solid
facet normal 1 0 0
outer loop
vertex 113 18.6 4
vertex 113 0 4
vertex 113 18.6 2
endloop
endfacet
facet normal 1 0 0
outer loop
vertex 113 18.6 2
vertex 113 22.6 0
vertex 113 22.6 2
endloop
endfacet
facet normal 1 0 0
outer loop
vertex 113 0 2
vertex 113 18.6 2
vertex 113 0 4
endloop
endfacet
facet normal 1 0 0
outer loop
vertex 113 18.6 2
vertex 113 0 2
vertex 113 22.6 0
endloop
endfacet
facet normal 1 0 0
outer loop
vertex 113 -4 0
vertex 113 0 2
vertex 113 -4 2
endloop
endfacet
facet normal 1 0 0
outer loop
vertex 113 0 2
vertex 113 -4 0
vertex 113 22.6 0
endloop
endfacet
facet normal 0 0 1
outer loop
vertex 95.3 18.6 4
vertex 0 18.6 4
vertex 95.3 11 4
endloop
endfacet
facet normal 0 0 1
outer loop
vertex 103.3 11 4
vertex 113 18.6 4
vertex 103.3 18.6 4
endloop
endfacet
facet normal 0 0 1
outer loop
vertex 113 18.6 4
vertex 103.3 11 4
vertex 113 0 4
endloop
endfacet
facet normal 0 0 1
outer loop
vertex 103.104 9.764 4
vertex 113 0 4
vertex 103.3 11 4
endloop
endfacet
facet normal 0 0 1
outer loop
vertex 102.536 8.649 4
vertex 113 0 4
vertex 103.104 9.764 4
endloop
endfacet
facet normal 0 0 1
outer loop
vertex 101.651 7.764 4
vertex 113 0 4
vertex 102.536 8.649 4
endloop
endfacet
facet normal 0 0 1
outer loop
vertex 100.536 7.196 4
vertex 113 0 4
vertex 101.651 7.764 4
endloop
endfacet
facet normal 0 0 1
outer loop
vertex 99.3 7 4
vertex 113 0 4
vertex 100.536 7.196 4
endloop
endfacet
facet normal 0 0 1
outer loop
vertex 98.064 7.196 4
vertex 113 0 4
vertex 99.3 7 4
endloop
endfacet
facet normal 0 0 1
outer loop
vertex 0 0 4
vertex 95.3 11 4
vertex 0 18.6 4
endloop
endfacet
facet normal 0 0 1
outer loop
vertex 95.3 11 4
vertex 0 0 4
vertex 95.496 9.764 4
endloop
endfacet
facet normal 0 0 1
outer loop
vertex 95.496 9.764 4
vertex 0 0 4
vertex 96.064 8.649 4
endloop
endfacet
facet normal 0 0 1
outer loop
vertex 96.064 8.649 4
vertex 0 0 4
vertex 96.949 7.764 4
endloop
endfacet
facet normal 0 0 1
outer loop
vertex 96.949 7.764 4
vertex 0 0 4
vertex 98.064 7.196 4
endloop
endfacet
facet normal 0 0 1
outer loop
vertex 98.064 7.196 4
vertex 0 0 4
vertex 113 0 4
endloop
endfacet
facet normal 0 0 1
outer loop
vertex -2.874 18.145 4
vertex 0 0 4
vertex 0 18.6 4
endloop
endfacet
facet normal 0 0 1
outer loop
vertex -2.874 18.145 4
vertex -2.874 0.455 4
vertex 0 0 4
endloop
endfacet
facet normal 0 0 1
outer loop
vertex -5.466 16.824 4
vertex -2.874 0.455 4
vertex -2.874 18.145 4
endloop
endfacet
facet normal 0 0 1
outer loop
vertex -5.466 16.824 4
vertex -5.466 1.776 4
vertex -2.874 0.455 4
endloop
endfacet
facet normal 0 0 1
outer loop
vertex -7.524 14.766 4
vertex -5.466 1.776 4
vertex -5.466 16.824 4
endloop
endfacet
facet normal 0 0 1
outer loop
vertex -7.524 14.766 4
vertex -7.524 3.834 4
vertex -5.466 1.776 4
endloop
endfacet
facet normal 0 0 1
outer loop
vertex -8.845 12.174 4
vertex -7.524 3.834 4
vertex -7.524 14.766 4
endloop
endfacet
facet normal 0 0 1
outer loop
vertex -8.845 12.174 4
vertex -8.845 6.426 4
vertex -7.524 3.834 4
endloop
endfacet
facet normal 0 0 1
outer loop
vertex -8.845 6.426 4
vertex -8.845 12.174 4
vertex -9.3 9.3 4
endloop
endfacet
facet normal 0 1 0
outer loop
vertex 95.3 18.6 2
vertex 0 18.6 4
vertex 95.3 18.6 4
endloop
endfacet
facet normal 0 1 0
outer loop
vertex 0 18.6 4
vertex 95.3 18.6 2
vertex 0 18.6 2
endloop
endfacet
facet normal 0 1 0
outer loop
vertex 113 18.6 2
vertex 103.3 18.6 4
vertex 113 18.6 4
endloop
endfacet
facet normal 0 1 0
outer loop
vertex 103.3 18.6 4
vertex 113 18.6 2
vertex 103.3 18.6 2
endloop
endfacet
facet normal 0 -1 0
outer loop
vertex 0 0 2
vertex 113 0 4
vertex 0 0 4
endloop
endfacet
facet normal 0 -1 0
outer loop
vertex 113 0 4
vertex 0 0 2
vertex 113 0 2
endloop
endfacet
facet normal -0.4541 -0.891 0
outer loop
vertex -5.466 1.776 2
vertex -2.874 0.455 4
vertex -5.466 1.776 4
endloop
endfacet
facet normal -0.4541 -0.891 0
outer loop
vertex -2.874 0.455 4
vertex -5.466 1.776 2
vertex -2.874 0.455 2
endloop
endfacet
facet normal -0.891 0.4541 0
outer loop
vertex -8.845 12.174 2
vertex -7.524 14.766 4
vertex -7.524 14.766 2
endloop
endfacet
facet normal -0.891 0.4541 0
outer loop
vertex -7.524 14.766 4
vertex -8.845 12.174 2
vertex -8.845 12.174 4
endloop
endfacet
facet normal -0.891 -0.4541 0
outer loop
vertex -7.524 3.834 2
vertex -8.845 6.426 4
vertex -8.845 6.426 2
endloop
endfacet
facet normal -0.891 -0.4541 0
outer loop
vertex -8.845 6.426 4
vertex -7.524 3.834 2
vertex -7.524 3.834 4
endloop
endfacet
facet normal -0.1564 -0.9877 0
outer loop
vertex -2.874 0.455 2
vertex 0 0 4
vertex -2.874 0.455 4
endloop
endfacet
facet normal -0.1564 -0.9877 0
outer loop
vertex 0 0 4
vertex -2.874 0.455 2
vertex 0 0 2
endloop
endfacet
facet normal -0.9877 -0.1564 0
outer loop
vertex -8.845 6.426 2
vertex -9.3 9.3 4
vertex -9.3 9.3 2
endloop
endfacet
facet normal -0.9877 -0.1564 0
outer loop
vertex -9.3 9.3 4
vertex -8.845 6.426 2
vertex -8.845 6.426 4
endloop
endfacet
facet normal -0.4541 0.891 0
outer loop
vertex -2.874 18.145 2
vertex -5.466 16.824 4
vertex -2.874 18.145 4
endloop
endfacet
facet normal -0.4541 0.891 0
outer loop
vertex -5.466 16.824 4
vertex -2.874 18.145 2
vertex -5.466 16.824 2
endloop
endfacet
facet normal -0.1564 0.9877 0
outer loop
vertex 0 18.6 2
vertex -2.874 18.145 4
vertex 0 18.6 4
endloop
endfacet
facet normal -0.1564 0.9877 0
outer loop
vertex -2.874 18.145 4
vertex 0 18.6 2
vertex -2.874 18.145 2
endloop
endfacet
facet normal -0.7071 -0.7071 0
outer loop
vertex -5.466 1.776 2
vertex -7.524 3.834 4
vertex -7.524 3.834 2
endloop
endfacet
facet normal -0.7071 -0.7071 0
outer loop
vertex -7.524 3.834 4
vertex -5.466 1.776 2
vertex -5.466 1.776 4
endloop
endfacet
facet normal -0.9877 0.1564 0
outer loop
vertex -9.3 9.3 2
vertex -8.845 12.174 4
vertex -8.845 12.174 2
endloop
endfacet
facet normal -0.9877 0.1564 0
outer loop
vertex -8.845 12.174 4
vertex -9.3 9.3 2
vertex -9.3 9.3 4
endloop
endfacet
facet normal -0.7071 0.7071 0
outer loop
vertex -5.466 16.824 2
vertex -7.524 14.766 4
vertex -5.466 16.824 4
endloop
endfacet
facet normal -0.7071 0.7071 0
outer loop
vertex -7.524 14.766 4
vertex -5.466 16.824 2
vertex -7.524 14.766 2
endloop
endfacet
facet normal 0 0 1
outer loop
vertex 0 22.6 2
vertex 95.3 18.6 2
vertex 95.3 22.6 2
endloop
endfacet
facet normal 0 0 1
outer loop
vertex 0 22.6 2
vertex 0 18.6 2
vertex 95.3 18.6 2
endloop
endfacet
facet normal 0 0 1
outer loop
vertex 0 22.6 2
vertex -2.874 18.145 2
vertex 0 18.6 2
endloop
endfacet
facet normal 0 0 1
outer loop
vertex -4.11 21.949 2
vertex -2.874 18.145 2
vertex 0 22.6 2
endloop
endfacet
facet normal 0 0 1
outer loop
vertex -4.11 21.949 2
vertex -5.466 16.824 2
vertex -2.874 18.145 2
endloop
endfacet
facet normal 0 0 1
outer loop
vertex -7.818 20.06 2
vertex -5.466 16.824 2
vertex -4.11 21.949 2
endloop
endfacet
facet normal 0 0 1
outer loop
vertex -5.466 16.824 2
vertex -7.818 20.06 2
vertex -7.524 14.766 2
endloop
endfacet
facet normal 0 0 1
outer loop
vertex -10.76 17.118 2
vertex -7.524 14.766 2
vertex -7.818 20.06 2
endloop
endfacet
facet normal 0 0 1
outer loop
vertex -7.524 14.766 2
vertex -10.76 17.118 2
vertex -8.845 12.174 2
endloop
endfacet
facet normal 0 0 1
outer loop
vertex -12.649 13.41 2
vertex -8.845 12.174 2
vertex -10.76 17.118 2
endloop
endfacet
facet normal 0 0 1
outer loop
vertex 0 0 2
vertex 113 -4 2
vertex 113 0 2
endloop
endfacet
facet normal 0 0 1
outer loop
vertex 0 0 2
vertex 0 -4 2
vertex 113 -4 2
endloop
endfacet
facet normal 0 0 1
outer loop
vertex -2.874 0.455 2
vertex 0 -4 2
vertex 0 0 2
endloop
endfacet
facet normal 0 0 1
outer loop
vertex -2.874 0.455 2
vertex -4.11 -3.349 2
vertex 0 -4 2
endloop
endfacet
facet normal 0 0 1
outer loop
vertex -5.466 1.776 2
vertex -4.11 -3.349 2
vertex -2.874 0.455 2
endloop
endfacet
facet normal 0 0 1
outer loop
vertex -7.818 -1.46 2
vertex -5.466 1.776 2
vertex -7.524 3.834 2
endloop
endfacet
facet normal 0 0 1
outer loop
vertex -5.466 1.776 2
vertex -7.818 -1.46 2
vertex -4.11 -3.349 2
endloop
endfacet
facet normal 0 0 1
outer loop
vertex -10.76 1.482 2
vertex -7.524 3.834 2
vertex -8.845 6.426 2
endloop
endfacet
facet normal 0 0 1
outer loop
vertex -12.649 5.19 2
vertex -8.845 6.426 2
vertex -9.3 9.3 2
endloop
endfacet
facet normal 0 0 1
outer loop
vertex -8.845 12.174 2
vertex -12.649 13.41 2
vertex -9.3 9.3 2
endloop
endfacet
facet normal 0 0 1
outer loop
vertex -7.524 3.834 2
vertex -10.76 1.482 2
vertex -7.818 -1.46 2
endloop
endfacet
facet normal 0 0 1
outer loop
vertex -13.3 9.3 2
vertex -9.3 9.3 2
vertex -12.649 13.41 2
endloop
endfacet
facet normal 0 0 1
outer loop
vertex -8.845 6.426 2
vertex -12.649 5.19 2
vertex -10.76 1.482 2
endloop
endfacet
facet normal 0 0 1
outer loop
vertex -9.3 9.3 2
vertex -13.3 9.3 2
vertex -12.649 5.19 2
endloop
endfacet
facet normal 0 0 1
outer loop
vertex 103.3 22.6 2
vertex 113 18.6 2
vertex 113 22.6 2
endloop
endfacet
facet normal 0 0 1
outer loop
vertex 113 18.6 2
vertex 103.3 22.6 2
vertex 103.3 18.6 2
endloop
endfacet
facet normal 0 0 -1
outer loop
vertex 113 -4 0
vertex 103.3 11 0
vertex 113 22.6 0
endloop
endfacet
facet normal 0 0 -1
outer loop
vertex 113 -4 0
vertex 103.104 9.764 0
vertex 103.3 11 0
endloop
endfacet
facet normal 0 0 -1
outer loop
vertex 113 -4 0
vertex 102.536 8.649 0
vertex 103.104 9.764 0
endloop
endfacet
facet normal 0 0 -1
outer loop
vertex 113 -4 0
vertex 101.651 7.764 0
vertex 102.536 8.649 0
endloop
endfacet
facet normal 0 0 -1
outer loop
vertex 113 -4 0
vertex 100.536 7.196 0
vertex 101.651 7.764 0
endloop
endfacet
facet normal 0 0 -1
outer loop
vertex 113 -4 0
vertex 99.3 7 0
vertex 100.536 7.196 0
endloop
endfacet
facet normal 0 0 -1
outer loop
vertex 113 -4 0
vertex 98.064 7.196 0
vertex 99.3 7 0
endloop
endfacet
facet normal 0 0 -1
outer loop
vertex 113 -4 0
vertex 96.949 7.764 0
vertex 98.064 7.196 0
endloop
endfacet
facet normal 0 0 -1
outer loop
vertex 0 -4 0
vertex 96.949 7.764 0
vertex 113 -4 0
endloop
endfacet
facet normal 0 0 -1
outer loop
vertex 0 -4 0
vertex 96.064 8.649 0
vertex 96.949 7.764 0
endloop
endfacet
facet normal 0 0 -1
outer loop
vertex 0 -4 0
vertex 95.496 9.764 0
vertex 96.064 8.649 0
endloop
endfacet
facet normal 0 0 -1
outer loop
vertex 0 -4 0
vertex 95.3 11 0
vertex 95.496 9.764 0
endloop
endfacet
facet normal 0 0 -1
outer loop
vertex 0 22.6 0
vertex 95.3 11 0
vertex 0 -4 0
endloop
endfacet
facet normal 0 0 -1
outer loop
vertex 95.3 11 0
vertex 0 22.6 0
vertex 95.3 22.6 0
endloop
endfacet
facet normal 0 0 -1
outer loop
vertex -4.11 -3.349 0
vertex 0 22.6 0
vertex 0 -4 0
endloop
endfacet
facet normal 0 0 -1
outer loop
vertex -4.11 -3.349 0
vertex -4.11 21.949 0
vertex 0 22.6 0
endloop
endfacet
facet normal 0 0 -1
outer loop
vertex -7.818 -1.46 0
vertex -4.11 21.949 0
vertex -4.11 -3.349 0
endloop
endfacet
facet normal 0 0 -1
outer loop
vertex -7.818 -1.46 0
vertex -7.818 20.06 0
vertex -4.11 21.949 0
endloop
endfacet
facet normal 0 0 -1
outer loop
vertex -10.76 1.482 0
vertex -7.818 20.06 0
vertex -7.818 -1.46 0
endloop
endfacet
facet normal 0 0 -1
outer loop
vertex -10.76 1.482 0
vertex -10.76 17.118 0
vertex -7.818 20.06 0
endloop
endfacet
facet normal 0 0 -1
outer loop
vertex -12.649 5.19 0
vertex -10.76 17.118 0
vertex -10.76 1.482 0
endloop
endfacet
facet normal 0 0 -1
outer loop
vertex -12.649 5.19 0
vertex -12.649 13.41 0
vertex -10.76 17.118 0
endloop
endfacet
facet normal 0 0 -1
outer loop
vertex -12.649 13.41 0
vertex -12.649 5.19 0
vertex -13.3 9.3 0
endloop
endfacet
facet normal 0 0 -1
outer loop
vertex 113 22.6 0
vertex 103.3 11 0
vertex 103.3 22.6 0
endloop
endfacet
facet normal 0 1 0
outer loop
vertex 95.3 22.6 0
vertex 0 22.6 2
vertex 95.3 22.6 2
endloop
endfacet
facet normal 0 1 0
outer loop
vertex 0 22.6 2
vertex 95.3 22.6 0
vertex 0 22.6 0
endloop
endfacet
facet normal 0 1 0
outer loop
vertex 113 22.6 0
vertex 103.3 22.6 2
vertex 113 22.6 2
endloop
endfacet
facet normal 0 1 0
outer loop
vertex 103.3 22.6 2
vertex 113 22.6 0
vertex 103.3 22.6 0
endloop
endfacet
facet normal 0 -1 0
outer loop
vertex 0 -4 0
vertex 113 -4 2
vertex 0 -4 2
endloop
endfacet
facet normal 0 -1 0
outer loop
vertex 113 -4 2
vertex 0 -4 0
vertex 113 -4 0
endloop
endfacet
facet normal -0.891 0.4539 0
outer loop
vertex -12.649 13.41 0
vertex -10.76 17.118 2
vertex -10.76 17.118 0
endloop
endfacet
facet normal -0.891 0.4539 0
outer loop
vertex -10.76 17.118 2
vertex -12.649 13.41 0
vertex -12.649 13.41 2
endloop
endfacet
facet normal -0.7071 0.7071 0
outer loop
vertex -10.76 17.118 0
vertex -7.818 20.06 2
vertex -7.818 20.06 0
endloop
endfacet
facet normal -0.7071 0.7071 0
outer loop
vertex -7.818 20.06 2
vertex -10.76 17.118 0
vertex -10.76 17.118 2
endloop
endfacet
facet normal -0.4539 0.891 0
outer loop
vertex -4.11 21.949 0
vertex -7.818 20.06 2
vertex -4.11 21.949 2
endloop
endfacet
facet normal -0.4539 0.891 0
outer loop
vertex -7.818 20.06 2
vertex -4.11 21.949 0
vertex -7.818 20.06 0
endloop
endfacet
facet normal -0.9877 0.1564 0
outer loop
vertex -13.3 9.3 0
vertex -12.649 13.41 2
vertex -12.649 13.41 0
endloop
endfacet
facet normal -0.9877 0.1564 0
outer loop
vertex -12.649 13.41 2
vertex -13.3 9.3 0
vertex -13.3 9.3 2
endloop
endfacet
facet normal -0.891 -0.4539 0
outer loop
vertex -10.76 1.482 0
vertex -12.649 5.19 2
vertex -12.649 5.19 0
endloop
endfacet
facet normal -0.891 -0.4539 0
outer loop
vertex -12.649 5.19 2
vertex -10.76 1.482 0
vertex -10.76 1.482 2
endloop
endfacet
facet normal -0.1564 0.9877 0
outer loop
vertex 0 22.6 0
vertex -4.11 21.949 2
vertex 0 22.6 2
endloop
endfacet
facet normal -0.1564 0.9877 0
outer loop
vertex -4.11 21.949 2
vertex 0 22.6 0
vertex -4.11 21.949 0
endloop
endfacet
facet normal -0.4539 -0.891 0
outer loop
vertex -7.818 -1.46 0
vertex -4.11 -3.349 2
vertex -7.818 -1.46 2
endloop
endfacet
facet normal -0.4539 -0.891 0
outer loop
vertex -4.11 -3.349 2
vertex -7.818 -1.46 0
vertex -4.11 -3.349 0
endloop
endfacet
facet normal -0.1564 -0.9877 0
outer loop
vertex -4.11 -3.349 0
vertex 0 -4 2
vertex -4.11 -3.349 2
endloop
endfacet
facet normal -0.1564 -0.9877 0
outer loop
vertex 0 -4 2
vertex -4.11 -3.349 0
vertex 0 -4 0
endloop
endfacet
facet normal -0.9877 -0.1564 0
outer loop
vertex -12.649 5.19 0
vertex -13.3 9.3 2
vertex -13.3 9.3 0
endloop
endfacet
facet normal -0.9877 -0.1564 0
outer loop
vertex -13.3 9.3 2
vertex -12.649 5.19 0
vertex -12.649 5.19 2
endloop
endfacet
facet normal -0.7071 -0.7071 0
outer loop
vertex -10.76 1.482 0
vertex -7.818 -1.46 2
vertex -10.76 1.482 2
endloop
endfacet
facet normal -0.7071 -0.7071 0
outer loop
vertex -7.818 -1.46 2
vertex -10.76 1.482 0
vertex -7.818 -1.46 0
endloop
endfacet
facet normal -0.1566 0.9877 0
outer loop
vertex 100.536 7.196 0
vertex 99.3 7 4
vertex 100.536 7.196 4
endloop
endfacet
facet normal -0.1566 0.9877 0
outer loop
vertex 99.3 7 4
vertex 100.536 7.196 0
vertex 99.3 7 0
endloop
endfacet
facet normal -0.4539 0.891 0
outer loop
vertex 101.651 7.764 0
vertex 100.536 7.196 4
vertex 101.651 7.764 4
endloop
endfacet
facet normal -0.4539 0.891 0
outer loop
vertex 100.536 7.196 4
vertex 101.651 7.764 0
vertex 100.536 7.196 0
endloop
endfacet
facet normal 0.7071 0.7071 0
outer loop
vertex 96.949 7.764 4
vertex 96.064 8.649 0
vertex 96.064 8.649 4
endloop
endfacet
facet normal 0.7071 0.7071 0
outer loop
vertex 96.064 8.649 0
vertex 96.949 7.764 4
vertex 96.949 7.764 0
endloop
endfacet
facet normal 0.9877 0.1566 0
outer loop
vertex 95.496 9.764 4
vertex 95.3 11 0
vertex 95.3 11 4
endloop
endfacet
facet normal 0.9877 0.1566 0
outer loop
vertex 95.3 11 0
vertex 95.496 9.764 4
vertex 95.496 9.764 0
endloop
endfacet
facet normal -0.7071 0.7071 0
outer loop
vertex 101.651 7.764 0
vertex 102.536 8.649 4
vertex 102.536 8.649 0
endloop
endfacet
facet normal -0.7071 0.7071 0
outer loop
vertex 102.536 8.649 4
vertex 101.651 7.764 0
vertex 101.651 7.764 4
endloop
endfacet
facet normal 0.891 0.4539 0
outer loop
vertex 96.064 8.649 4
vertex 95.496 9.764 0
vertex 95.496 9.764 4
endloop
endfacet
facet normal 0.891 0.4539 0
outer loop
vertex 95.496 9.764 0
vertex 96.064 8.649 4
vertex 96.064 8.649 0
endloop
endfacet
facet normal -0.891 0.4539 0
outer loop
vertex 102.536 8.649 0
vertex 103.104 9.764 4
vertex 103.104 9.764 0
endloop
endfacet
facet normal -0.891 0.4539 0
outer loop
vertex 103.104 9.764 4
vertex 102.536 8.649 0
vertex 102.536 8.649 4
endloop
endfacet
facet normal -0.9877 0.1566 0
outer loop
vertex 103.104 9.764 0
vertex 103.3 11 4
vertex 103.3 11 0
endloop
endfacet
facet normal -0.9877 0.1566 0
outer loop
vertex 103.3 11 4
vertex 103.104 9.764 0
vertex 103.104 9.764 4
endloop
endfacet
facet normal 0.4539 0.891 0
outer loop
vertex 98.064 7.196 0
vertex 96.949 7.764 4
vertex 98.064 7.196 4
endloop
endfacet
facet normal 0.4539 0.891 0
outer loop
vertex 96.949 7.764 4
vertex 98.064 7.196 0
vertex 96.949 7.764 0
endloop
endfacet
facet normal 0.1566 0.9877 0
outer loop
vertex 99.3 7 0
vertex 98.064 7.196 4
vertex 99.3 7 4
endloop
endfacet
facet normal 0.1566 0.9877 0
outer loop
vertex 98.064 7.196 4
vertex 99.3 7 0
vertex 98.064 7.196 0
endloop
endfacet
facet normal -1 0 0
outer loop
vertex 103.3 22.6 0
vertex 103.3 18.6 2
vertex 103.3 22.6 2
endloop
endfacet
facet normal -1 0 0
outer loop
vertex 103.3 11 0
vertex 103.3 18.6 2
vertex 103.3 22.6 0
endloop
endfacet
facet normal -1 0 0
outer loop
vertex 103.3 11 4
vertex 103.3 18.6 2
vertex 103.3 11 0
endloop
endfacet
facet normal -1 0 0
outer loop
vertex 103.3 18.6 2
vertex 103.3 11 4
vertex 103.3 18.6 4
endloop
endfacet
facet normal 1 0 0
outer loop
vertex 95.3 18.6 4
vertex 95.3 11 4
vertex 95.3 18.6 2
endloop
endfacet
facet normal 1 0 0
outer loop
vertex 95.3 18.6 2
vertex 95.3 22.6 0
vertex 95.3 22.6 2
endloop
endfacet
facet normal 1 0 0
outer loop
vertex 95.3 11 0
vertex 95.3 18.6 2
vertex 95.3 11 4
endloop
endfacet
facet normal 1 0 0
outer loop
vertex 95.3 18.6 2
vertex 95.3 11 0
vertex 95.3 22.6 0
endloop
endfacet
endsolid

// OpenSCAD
l = 113;
r = 9.3;
h = 4;
del = 4;

difference() {
    union() {
        translate( [ 0, 0, 1 ] )
        {
            cube( [ l, 2 * r, h - 1 ] );
            translate( [ 0, r, 0 ] )
                cylinder( r = r, h = h - 1, $fn = 20 );
        }
        translate( [ 0, -del, 0 ] )
            cube( [ l, 2 * ( r + del ), h / 2 ] );
        translate( [ 0, r, 0 ] )
            cylinder( r = r + del, h = h / 2, $fn = 20 );
    }
//    translate( [ 0, r, -1 ] )
//    {
//        #cylinder( r = 4, h = 15, $fn = 20 );
//        translate( [ -15, -4, 0 ] )
//            #cube( [ 15, 8, 10 ] );
//    }

    translate( [ 90, 11, 0 ] )
    rotate( -90, [ 0, 0, 1 ] )
        translate( [ 0, r, -1 ] )
        {
            cylinder( r = 4, h = 15, $fn = 20 );
            translate( [ -15, -4, 0 ] )
                cube( [ 15, 8, 10 ] );
        }
}
